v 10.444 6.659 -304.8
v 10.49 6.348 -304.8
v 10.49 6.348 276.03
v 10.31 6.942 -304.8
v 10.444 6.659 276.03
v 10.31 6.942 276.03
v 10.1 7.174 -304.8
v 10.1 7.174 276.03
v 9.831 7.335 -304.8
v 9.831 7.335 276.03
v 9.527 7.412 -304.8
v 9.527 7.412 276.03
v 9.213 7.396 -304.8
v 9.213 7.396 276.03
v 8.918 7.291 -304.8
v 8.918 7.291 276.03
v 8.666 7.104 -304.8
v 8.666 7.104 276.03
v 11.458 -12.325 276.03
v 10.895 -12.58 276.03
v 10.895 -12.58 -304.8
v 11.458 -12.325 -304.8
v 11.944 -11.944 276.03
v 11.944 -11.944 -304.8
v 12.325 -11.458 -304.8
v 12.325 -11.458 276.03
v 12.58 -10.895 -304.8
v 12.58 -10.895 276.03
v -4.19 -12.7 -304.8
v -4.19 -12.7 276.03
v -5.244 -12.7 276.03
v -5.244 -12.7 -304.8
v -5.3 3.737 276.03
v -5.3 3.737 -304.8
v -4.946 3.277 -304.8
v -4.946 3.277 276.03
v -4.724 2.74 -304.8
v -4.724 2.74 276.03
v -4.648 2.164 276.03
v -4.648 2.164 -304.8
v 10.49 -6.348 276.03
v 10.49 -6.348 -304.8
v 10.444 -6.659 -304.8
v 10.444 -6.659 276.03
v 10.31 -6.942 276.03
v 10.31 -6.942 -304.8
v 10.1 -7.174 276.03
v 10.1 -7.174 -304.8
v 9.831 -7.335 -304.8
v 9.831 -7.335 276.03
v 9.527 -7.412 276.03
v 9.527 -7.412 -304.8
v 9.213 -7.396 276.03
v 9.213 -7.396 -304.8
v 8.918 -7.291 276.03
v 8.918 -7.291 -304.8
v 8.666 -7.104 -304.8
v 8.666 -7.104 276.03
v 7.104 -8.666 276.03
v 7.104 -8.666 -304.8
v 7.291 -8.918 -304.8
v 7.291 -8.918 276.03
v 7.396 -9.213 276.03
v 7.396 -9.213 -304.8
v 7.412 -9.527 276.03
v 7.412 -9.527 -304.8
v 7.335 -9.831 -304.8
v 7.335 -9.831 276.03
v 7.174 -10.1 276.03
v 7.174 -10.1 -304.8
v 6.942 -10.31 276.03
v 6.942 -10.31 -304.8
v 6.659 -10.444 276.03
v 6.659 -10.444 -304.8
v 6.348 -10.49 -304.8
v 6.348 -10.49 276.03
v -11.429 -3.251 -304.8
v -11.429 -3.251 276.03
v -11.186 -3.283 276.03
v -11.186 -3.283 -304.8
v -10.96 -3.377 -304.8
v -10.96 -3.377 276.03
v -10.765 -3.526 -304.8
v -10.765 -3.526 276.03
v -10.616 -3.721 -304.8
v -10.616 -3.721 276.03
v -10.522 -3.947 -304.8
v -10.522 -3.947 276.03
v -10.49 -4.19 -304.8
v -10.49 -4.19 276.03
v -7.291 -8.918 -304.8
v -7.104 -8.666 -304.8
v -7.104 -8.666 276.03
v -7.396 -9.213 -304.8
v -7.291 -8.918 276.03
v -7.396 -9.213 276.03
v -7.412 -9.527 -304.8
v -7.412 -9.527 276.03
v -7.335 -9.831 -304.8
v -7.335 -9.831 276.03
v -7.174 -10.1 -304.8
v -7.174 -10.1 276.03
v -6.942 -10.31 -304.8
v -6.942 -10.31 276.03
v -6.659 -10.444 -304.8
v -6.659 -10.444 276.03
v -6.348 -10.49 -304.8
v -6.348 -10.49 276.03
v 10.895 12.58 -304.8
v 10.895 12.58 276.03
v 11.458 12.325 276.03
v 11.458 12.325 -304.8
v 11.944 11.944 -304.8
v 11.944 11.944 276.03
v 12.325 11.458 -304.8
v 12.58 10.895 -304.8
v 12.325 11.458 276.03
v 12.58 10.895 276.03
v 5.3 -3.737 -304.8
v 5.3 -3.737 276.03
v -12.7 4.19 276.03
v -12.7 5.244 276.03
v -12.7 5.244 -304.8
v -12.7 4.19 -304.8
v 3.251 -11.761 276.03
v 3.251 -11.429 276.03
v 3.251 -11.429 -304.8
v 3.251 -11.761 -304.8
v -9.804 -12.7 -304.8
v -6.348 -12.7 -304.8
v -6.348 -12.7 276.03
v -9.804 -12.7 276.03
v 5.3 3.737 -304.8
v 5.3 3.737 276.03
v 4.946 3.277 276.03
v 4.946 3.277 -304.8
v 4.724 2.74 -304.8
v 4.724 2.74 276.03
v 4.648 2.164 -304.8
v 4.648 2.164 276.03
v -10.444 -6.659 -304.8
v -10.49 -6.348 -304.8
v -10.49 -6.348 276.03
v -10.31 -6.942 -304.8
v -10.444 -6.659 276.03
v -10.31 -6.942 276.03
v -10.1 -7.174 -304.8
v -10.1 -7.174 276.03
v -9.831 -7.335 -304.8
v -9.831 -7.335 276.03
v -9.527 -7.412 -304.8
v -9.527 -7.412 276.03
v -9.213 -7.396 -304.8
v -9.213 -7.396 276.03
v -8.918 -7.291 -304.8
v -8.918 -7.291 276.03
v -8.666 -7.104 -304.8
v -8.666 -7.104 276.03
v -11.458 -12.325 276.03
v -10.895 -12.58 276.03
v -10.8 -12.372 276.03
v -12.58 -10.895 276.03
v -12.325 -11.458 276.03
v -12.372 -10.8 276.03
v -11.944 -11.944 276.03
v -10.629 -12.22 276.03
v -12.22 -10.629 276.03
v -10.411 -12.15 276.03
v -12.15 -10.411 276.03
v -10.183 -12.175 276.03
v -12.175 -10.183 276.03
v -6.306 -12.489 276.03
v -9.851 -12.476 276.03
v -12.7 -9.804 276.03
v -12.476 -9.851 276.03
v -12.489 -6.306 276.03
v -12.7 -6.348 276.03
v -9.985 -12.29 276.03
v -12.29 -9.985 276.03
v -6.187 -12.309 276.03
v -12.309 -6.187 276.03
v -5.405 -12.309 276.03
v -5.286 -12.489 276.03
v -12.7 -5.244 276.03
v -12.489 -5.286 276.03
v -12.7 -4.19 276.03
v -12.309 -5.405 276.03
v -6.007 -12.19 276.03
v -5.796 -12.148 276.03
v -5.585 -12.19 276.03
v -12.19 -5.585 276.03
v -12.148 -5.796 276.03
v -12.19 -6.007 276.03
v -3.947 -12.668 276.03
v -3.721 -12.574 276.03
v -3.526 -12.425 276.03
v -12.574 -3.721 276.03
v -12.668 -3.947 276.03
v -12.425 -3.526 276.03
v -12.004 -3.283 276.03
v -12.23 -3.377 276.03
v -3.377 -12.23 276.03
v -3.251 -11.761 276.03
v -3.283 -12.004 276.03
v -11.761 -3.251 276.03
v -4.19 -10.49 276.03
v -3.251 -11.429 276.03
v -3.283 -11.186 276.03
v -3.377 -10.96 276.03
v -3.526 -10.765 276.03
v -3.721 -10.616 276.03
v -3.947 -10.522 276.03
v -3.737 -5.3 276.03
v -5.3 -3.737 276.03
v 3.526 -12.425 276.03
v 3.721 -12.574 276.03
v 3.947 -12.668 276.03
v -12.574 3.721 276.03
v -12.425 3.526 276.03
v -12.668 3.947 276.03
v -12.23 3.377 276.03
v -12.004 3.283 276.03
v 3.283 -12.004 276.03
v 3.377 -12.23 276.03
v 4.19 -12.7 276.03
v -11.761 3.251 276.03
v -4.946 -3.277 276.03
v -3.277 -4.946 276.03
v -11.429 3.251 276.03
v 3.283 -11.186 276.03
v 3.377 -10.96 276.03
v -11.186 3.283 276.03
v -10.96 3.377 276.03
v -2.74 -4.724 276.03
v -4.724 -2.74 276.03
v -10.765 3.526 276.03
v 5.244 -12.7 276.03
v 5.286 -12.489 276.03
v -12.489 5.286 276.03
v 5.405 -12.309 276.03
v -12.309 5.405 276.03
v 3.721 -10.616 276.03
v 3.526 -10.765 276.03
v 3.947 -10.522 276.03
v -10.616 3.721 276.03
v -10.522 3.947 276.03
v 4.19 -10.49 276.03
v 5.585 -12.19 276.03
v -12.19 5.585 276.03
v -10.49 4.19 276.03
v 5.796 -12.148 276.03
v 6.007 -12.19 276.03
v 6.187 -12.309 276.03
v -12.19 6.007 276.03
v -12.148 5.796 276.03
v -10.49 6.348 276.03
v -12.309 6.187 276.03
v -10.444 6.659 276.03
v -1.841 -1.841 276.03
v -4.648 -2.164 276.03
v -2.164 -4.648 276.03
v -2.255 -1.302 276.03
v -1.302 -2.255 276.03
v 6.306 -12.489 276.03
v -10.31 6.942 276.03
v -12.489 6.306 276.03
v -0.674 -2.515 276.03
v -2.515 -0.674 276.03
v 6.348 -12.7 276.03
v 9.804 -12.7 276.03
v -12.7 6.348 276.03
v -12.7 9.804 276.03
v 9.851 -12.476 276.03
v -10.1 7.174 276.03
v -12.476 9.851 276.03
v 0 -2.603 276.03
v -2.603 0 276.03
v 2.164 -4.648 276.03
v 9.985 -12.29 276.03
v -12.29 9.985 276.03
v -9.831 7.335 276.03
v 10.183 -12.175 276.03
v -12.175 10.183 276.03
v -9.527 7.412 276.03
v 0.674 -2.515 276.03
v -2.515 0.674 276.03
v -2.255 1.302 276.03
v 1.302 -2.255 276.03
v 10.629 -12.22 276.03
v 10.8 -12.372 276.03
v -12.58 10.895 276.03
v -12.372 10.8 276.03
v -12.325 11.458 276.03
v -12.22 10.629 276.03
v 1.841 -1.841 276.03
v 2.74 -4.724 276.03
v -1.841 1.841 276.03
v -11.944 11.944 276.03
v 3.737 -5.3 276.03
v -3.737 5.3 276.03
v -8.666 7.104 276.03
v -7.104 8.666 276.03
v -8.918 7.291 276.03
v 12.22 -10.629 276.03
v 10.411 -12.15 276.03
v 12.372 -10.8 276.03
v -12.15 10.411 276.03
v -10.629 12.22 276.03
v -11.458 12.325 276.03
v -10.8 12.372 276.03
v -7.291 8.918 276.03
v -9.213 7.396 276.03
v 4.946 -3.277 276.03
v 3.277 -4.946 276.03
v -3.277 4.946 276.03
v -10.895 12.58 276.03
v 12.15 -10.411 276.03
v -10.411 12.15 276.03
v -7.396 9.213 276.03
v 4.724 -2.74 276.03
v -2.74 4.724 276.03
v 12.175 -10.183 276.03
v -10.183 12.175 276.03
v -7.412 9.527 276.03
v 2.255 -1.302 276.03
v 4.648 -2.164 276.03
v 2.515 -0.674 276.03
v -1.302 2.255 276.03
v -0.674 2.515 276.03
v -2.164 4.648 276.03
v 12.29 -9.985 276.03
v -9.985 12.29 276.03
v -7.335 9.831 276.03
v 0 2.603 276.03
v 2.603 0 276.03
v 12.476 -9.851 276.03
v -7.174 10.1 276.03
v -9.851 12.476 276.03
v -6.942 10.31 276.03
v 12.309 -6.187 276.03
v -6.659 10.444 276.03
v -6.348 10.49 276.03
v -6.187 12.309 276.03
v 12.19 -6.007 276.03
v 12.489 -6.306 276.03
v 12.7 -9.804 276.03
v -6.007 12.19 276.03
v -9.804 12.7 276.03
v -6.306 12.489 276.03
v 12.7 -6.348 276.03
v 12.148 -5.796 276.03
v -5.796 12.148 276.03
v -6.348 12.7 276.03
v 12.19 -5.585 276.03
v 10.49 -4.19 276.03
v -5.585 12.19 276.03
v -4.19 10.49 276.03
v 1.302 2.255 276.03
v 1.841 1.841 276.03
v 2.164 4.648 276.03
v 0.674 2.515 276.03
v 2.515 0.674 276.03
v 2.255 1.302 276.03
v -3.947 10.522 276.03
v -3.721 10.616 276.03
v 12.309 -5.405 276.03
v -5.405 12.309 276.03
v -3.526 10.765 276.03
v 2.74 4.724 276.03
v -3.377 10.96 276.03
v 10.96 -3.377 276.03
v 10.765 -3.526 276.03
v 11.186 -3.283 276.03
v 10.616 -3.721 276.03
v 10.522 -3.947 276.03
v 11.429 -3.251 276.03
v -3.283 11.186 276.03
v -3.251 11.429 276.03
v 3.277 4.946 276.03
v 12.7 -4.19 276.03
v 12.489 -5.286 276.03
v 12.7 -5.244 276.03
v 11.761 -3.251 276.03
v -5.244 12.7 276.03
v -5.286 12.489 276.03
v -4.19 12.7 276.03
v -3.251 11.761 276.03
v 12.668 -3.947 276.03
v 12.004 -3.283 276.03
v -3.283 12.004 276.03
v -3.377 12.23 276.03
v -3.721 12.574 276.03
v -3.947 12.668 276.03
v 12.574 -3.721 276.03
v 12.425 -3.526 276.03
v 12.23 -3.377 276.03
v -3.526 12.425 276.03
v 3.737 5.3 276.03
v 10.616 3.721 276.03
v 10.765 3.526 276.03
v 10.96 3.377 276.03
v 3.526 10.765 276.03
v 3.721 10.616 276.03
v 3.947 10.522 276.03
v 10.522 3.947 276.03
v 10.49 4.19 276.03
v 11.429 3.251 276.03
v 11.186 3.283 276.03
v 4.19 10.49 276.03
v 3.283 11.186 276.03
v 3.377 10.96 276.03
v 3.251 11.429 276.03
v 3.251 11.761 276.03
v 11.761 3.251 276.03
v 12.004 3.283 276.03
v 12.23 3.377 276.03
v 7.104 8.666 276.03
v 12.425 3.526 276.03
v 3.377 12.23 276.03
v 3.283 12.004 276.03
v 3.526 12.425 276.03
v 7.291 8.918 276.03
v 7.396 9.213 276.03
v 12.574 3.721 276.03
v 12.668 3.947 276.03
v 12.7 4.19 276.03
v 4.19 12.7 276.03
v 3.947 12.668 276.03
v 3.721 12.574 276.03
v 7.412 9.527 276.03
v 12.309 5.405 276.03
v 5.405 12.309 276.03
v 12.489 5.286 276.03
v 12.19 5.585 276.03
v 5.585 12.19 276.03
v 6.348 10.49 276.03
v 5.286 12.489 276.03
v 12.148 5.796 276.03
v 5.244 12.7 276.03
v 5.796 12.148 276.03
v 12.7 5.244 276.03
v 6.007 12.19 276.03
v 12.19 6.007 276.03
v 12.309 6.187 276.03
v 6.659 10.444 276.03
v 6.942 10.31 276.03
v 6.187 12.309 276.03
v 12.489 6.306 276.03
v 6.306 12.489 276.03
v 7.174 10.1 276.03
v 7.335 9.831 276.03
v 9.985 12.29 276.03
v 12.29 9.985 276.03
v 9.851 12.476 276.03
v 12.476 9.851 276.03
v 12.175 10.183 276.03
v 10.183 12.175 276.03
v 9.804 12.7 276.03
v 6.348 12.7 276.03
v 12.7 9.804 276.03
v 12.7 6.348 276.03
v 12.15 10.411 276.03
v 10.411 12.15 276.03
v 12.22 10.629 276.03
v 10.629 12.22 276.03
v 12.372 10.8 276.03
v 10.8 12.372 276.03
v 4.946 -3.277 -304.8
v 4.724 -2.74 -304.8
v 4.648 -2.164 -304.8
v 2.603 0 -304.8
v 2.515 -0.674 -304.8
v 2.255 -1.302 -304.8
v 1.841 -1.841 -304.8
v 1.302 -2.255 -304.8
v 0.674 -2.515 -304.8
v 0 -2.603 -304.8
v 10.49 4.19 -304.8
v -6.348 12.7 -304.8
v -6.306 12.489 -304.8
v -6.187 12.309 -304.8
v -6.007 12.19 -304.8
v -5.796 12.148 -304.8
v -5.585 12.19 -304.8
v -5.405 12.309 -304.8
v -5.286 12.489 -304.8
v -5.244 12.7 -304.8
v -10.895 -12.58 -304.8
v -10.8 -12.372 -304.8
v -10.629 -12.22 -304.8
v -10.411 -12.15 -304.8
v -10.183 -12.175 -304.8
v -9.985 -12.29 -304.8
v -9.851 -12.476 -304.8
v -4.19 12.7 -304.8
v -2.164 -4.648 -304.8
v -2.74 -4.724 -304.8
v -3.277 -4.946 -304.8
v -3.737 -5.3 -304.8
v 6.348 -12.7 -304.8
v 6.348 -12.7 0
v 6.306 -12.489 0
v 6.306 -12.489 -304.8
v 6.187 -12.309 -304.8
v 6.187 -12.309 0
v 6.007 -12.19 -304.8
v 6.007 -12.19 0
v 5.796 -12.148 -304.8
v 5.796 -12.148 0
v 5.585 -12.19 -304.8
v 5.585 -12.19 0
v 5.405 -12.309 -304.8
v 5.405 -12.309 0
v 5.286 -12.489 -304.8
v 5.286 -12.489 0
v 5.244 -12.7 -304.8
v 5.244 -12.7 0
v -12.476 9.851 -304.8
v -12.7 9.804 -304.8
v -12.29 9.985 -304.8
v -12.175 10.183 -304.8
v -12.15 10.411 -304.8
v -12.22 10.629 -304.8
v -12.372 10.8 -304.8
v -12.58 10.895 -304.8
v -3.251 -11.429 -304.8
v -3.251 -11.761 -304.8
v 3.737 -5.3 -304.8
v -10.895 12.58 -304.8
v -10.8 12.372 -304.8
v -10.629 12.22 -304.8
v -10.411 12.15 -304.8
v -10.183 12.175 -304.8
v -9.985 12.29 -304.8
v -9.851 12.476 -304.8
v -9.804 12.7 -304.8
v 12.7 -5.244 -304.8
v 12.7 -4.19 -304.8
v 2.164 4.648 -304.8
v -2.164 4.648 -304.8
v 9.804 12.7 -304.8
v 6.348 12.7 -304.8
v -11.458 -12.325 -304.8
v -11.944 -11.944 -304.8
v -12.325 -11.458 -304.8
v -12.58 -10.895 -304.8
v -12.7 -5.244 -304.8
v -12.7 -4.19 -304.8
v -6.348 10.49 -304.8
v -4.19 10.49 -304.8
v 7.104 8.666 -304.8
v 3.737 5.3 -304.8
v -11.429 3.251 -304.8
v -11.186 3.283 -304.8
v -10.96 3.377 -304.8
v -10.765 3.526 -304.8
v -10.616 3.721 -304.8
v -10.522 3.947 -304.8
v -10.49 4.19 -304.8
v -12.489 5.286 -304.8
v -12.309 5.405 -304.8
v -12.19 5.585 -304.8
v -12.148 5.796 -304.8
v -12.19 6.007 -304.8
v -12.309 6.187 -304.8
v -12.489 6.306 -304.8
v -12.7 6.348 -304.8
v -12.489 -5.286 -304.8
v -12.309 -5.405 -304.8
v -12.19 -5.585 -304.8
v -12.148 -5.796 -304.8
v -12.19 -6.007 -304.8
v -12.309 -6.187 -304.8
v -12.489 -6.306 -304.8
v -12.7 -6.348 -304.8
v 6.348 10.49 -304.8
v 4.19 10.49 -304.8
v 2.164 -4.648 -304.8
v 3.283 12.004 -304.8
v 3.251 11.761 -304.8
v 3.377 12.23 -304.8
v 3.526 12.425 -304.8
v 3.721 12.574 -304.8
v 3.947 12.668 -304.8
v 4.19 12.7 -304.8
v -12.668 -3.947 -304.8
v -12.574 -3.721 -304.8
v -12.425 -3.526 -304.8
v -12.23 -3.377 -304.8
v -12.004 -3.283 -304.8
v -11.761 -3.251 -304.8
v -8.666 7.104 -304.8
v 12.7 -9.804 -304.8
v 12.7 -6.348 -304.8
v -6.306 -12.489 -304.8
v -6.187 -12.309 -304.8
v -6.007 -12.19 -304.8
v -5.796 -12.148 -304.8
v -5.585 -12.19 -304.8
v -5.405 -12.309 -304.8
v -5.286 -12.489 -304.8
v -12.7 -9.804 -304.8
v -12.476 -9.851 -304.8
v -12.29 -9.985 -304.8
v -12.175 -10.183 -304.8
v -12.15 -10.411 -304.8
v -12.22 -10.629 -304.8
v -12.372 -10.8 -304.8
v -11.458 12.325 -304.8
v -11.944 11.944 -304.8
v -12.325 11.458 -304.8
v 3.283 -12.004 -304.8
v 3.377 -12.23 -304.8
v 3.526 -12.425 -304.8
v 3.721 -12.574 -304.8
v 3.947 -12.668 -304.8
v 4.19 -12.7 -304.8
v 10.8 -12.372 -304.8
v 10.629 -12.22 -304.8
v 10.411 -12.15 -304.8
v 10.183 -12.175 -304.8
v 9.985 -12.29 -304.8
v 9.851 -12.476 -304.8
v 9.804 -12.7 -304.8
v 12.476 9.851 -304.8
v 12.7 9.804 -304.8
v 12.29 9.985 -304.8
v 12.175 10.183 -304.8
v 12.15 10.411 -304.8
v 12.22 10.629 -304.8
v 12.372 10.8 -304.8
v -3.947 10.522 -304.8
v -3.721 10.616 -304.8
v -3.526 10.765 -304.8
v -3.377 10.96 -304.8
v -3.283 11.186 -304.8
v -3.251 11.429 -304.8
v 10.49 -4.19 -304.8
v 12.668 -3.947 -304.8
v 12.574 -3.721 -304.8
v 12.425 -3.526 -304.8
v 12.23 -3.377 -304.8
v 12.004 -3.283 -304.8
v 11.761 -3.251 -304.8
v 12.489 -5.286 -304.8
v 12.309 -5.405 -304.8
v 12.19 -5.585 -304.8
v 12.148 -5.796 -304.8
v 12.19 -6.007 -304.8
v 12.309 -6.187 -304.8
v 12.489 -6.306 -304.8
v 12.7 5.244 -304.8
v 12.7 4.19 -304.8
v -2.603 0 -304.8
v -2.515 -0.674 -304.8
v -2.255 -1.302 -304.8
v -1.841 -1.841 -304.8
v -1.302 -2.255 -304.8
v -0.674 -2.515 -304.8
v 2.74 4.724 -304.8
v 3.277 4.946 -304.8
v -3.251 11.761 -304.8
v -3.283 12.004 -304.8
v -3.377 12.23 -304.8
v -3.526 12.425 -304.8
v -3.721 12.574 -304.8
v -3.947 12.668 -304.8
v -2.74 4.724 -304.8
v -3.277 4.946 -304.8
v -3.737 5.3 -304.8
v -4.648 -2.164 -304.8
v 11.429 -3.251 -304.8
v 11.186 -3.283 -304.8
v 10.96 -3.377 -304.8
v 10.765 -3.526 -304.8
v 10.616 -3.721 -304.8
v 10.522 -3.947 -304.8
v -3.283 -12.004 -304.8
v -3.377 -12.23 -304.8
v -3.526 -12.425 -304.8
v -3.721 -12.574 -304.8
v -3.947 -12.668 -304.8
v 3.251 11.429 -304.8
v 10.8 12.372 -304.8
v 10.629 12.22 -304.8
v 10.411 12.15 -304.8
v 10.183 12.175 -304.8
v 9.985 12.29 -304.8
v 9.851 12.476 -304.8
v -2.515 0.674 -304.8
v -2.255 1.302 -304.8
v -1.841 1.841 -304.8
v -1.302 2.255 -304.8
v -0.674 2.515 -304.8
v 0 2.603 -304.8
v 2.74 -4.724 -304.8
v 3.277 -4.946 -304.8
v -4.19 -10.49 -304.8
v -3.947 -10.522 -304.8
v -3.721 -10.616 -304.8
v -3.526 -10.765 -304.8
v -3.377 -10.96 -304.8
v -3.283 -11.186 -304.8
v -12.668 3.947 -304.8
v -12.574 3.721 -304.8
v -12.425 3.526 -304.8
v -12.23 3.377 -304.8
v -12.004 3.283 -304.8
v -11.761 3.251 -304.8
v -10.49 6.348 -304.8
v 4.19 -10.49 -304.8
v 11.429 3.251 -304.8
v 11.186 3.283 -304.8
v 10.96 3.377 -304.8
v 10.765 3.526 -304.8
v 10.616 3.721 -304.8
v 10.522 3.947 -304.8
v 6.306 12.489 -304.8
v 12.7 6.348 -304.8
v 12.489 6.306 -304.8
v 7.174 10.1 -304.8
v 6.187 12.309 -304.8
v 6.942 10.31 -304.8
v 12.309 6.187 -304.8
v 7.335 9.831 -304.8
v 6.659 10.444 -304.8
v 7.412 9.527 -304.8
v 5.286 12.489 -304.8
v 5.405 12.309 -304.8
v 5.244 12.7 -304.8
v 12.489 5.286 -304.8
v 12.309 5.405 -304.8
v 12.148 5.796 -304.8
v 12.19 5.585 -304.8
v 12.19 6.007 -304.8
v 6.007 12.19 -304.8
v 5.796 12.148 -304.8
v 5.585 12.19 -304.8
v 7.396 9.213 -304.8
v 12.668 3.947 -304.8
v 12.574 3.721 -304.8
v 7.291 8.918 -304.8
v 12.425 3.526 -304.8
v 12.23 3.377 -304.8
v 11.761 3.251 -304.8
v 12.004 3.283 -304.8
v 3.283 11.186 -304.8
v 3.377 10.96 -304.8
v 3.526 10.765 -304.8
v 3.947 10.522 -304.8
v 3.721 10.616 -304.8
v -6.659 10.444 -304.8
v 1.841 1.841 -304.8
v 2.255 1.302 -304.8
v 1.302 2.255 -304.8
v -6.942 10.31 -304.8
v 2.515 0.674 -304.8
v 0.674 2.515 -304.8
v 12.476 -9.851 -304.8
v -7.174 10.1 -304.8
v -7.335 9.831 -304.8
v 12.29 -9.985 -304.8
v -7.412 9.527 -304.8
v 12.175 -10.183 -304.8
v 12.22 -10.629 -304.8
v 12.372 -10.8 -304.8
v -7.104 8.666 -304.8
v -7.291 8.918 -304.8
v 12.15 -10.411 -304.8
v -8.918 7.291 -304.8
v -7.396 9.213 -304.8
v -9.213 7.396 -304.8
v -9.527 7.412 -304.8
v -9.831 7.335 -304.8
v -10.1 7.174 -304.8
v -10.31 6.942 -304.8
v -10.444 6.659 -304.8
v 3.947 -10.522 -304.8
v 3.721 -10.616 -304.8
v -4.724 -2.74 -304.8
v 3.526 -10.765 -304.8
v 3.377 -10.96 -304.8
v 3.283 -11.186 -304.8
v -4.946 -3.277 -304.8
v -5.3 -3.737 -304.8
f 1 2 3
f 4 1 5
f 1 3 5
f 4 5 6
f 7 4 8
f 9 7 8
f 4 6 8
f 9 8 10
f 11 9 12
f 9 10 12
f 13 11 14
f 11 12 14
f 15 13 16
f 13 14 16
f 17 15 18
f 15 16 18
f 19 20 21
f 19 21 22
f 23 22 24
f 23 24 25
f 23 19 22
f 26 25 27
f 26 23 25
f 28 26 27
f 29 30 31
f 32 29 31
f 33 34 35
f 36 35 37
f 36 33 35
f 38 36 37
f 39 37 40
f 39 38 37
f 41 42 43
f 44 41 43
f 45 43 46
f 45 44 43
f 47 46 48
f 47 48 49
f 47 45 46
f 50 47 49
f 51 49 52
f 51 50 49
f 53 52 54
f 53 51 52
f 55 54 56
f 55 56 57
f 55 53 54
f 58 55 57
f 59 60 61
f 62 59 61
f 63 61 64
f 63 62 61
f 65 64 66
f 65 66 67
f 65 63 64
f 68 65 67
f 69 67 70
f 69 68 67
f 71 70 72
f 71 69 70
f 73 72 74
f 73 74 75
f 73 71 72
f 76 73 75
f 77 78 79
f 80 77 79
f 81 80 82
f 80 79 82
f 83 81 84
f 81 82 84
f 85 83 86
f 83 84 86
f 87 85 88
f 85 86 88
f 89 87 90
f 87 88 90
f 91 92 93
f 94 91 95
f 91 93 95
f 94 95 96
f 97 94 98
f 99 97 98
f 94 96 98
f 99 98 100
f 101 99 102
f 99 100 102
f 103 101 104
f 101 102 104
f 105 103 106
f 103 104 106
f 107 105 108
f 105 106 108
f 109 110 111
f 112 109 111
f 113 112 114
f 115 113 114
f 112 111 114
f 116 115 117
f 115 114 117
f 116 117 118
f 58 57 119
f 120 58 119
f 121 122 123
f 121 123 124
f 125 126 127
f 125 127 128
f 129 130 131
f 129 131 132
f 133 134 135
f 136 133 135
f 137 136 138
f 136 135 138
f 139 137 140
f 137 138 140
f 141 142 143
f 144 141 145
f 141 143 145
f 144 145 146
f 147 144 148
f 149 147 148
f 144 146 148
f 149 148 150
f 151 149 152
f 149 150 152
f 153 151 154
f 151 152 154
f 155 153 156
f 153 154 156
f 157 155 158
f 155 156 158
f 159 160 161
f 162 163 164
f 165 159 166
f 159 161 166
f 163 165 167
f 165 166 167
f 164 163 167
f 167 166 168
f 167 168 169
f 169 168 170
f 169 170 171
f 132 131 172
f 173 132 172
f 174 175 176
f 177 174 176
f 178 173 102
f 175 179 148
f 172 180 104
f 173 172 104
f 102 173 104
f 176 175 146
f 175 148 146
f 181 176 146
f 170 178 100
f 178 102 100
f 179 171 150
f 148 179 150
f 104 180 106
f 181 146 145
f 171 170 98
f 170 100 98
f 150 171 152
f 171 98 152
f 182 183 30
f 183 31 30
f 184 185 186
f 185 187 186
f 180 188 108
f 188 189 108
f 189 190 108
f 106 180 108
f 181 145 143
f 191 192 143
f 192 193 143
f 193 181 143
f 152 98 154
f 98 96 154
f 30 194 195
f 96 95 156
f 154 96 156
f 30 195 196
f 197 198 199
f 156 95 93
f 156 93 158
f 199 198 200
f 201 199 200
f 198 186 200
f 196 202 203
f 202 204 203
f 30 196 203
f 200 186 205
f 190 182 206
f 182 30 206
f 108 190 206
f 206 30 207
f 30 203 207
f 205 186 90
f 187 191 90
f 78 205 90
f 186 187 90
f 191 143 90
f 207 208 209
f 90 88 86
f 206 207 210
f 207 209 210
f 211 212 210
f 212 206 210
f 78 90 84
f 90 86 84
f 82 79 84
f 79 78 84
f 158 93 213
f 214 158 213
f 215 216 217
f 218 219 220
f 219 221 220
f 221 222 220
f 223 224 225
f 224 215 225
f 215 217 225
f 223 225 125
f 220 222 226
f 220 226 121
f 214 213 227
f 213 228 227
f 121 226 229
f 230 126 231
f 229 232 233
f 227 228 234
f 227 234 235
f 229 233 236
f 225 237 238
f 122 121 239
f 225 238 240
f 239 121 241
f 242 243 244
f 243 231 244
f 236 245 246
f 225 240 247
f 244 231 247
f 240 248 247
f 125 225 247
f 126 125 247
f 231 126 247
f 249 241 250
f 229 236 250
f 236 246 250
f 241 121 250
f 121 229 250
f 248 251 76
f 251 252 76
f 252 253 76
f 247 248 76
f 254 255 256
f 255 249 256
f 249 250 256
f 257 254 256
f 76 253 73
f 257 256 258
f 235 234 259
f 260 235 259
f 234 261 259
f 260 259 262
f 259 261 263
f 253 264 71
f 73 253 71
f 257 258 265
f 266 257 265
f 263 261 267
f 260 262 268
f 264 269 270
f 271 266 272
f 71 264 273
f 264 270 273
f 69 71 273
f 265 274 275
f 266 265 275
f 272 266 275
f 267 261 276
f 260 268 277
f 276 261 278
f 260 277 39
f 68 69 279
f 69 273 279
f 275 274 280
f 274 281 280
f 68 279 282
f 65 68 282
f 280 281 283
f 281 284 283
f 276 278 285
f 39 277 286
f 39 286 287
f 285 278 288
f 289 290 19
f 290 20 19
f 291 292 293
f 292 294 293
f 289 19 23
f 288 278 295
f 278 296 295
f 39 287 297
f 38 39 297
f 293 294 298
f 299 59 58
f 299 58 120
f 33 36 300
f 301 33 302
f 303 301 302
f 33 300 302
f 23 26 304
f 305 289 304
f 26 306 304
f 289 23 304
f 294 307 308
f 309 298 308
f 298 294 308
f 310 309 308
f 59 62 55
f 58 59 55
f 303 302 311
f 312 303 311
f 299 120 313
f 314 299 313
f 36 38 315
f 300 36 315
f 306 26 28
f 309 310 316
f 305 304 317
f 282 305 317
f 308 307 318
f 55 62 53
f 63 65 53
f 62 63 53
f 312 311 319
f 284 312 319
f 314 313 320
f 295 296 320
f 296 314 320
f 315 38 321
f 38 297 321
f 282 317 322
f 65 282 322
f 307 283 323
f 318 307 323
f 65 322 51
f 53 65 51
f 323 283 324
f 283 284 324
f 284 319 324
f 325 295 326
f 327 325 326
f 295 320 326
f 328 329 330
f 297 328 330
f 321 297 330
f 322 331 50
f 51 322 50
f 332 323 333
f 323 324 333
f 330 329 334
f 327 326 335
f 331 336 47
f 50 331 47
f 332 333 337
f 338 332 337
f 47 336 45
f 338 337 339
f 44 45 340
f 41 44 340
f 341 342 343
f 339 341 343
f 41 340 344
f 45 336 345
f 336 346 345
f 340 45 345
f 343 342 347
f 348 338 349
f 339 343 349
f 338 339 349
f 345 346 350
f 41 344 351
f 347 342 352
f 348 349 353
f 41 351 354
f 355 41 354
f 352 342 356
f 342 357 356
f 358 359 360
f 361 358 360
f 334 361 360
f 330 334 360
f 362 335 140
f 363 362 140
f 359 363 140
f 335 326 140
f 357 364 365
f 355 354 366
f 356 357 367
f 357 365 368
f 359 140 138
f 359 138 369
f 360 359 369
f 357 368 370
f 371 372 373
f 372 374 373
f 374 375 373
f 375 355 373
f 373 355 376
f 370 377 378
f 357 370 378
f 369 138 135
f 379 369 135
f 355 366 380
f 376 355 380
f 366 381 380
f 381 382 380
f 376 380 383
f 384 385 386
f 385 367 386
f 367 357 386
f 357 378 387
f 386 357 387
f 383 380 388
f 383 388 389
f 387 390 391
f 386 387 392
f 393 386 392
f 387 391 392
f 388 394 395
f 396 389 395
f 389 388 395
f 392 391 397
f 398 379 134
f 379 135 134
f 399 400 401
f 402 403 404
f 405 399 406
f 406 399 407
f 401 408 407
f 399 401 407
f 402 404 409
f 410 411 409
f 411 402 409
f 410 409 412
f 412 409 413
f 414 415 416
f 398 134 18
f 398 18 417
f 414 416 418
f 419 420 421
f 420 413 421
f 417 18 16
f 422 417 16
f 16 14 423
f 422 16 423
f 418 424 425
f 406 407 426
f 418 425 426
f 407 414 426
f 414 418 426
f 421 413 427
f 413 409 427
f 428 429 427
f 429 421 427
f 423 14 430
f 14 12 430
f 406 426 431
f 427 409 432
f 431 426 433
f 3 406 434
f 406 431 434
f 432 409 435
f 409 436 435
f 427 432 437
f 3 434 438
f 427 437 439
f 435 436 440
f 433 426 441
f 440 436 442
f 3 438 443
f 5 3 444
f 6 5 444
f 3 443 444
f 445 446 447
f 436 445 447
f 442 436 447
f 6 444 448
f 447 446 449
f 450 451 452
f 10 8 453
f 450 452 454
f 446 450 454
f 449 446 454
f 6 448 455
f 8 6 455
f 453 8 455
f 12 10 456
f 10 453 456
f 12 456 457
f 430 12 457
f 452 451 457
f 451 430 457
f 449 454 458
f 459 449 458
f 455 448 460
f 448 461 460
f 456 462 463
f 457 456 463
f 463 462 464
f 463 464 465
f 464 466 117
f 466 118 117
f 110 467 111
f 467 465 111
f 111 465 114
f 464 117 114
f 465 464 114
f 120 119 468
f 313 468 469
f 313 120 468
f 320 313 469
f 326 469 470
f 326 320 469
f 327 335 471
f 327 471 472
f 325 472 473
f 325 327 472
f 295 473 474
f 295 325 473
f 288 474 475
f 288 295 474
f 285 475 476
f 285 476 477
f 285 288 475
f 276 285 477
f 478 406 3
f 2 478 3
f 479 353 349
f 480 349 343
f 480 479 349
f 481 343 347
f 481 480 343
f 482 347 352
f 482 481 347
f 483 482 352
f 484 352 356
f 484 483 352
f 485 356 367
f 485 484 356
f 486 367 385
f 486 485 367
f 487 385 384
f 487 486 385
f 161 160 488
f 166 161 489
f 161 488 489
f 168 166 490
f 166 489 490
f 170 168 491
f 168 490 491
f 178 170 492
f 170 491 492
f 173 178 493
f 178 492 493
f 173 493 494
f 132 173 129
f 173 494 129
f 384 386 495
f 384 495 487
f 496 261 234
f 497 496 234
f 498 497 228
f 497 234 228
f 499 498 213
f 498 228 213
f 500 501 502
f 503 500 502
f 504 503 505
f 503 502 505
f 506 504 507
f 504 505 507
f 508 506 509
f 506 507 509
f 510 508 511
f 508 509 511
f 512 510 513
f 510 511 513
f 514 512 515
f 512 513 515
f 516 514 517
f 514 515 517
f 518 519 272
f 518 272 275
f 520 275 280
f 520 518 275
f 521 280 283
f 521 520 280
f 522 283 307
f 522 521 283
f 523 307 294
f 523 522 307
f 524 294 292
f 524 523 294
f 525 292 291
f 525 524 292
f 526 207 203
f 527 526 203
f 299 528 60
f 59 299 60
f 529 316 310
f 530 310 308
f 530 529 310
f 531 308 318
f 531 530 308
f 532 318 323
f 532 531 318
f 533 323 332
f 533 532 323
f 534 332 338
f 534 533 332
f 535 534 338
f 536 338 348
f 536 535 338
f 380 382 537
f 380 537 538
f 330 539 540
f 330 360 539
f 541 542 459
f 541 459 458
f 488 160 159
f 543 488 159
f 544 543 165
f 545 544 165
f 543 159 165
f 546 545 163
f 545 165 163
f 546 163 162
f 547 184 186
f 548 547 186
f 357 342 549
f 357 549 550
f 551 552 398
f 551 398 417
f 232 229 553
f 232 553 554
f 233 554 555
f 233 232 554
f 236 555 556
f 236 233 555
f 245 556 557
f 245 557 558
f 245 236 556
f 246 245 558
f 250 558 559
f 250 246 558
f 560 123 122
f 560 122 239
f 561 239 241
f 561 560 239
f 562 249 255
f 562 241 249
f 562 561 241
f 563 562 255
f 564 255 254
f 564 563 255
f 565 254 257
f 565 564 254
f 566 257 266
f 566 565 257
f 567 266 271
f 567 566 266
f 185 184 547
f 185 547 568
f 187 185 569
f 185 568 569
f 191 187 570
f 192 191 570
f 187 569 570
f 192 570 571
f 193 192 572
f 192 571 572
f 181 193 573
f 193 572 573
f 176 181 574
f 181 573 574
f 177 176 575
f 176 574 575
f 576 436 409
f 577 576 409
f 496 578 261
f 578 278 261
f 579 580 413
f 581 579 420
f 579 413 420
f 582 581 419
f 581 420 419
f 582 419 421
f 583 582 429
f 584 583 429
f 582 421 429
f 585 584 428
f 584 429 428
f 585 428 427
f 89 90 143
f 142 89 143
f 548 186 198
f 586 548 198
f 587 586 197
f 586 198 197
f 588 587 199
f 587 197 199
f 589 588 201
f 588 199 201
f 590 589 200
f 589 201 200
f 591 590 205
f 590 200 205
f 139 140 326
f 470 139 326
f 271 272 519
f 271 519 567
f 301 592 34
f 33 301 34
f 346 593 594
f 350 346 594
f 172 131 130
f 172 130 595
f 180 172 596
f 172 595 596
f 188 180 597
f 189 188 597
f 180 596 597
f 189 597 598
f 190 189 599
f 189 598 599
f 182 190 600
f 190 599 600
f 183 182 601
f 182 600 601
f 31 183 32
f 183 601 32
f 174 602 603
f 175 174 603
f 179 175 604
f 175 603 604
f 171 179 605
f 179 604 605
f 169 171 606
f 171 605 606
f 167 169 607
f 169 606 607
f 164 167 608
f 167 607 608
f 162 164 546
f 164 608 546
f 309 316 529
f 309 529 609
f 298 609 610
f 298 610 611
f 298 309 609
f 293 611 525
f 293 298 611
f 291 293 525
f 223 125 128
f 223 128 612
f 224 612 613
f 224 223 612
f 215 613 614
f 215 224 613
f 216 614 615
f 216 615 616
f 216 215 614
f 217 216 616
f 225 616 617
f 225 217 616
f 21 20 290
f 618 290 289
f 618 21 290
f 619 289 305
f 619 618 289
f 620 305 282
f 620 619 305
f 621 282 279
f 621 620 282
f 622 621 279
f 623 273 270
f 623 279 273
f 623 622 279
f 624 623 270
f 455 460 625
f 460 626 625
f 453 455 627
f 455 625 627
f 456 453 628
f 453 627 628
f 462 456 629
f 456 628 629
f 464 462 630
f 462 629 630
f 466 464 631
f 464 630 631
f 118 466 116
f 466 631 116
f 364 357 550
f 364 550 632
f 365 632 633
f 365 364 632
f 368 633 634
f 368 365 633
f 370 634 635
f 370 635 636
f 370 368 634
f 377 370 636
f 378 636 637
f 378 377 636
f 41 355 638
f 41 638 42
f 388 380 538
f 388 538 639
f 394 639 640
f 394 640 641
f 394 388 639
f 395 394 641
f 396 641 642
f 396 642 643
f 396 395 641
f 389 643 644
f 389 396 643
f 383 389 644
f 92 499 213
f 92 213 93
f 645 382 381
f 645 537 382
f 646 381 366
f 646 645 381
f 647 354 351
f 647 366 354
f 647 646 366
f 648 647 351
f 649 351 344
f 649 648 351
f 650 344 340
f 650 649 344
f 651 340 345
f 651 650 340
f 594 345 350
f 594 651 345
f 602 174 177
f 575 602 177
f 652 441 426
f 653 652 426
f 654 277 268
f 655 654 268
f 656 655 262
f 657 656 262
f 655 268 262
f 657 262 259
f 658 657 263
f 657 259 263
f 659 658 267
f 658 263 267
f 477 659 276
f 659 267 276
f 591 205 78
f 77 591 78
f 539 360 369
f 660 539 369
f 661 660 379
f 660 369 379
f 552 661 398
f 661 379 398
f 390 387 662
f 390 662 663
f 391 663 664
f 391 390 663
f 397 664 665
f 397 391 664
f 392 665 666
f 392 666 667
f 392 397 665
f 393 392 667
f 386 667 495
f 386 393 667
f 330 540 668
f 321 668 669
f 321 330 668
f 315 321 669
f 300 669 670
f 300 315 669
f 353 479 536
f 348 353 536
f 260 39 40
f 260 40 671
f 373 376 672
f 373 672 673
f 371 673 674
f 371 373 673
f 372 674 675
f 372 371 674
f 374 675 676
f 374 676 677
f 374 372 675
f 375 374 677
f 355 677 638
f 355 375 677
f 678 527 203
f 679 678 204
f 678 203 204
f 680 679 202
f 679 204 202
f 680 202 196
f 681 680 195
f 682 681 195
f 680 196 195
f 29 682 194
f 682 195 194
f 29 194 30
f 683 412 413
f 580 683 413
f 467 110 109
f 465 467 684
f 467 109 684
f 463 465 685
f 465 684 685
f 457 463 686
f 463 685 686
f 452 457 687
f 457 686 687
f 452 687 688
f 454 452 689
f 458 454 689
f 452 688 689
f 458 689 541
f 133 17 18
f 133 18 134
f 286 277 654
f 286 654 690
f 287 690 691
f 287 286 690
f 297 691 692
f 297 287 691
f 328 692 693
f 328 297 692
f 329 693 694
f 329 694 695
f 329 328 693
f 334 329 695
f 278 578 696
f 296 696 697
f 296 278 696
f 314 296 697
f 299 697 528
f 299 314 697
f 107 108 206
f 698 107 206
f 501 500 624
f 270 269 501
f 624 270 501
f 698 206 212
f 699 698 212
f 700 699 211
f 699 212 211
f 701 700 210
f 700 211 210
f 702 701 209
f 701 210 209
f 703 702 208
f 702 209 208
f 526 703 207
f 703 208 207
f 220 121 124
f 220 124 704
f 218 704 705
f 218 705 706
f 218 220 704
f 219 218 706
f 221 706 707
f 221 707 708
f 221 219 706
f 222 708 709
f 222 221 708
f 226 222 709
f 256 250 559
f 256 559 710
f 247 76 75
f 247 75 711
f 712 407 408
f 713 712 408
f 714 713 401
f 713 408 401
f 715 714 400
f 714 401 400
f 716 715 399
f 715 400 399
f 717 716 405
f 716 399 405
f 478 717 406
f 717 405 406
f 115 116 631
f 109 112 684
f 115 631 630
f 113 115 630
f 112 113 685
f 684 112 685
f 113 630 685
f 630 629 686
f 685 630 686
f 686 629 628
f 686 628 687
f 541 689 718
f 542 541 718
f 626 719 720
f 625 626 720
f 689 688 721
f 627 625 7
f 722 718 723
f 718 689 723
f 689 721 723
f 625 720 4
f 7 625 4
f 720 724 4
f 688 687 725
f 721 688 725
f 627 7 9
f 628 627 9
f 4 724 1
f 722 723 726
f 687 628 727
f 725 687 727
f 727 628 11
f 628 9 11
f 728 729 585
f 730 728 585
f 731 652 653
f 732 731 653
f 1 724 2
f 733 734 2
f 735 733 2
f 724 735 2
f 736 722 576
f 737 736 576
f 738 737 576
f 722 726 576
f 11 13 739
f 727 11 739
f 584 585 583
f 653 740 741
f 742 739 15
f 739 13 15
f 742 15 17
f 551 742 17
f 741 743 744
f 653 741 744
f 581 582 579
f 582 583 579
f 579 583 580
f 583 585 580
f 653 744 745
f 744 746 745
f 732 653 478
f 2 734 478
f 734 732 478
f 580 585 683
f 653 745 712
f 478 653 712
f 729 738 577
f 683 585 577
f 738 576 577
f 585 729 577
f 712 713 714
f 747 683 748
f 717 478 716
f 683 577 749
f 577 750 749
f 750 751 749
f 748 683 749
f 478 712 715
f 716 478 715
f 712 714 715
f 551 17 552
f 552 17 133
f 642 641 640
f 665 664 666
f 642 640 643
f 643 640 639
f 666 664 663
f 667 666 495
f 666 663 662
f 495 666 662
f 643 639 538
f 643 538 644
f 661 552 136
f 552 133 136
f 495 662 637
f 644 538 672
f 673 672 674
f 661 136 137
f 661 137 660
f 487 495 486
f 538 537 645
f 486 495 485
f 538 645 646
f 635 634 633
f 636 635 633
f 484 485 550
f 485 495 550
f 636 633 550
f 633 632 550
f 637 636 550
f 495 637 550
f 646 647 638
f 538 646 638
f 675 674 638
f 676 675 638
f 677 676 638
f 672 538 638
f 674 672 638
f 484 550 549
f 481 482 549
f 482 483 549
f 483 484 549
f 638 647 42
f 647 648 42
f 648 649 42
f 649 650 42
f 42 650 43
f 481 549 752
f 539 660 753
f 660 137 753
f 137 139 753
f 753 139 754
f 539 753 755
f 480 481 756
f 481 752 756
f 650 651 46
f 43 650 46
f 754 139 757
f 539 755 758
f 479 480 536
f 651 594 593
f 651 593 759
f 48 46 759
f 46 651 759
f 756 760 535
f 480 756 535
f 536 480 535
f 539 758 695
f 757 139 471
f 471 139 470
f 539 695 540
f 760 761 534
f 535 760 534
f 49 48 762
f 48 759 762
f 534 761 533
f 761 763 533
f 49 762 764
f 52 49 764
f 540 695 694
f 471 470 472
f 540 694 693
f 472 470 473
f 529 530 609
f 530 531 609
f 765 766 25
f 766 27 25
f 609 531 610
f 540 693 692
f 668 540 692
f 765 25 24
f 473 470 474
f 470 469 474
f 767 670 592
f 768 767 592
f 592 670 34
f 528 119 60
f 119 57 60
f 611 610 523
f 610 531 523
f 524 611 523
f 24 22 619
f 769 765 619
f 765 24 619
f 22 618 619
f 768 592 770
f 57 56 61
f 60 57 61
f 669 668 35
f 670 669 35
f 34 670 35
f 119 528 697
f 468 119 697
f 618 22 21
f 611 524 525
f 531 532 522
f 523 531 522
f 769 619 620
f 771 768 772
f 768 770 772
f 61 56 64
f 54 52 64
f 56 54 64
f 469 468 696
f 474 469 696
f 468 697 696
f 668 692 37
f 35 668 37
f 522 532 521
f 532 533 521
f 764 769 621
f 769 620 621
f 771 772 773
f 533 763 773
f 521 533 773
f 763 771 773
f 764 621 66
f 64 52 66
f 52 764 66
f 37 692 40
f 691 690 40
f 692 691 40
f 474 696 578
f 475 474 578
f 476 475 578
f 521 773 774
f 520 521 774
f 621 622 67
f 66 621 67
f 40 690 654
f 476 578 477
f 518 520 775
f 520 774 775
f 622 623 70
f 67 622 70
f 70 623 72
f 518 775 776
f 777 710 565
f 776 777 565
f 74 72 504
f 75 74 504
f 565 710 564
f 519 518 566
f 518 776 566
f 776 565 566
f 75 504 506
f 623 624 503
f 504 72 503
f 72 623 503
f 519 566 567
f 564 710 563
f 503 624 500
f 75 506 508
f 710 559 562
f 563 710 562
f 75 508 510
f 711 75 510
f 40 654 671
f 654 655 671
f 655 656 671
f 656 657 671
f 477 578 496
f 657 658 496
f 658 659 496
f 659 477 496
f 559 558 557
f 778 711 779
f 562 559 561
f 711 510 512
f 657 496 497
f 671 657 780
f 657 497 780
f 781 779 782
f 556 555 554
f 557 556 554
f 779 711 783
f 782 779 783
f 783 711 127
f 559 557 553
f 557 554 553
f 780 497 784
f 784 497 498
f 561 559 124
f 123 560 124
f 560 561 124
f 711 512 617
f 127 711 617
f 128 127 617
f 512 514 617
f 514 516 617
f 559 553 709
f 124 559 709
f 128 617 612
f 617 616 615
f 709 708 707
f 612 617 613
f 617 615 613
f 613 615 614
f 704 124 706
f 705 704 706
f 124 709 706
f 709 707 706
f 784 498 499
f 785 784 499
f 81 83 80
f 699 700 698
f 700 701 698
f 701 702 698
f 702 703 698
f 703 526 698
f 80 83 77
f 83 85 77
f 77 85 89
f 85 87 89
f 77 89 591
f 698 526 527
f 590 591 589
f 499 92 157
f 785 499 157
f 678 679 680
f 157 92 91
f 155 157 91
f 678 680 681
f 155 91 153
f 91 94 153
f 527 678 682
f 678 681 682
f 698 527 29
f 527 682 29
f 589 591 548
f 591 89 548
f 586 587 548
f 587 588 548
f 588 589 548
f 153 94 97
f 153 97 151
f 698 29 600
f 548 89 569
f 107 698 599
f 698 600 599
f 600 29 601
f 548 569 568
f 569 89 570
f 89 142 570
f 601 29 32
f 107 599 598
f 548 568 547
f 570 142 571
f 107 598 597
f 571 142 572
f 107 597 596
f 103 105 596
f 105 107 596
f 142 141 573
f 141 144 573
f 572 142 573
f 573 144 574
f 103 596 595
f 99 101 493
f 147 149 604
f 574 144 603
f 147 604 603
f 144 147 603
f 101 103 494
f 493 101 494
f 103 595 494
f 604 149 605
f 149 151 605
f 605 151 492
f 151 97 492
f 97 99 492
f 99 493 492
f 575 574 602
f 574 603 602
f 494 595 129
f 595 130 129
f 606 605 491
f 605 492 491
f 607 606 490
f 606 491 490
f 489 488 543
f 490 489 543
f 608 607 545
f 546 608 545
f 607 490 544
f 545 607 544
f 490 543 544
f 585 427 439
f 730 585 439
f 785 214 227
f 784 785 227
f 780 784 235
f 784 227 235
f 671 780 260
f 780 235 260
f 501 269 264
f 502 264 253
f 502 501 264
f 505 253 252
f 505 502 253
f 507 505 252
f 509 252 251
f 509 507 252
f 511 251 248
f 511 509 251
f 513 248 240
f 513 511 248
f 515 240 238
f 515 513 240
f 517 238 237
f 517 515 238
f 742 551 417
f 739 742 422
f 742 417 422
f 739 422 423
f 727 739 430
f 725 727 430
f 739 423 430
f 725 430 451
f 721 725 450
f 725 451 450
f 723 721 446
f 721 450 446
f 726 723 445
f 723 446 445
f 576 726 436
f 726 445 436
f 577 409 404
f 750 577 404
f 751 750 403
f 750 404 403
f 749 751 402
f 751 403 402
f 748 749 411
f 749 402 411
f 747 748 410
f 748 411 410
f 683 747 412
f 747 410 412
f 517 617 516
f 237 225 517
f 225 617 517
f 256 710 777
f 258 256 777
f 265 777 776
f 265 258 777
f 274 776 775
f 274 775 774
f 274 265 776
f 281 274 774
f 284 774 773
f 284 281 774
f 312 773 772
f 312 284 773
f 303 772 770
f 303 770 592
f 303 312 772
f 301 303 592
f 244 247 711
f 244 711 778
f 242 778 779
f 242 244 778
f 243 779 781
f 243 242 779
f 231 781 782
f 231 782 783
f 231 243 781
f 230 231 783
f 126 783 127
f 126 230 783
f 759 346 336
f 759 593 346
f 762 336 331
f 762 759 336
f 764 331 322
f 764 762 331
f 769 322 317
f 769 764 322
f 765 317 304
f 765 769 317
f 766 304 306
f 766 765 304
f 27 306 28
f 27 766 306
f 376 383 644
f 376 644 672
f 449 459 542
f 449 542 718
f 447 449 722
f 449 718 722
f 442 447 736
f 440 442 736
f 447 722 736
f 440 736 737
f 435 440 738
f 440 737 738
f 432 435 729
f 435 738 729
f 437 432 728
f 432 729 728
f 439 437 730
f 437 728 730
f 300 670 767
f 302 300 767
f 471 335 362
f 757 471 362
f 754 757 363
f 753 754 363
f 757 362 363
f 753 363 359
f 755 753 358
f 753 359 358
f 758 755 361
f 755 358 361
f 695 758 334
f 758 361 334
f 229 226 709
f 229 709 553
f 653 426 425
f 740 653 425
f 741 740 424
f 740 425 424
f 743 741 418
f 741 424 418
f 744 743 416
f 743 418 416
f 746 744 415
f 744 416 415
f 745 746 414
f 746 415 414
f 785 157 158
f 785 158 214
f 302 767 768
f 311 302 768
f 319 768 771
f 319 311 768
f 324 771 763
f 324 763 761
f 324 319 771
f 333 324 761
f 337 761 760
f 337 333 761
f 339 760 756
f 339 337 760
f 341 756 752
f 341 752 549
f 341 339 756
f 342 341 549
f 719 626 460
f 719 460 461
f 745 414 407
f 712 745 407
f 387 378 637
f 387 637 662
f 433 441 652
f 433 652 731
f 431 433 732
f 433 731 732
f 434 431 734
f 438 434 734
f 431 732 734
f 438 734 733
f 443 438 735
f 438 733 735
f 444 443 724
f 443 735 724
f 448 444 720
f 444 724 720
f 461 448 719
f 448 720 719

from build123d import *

# Parameters (mm, degrees)
BOSS_EXTRUDE1_DEPTH     = 304.8
SKETCH5_R               = 0.55245
CUT_EXTRUDE1_DEPTH      = 305.8
CUT_EXTRUDE1_DEPTH_BACK = 305.8
SKETCH6_W               = 28.77
SKETCH6_H               = 75.458782243
CUT_EXTRUDE2_DEPTH      = 60


with BuildPart() as part:
    # Sketch4 → Boss-Extrude1 (new body, symmetric)
    with BuildSketch(Plane.XY):
        with BuildLine():
            Line((4.190365, -12.7), (10.11729625, -12.7))
            ThreePointArc((10.11729625, -12.7), (11.943543585, -11.943543585), (12.7, -10.11729625))
            Line((12.7, -10.11729625), (12.7, -4.190365))
            ThreePointArc((12.7, -4.190365), (12.42492494, -3.52627506), (11.760835, -3.2512))
            Line((11.760835, -3.2512), (11.429365, -3.2512))
            ThreePointArc((11.429365, -3.2512), (10.76527506, -3.52627506), (10.4902, -4.190365))
            Line((10.4902, -4.190365), (10.4902, -6.348478019))
            ThreePointArc((10.4902, -6.348478019), (9.830707141, -7.335478831), (8.666460301, -7.103895736))
            Line((8.666460301, -7.103895736), (5.299899128, -3.737334563))
            ThreePointArc((5.299899128, -3.737334563), (4.817571085, -3.015479634), (4.6482, -2.16399369))
            Line((4.6482, -2.16399369), (4.6482, 0))
            Line((4.6482, 0), (2.6035, 0))
            ThreePointArc((2.6035, 0), (1.840952505, -1.840952505), (0, -2.6035))
            Line((0, -2.6035), (0, -4.6482))
            Line((0, -4.6482), (2.16399369, -4.6482))
            ThreePointArc((2.16399369, -4.6482), (3.015479634, -4.817571085), (3.737334563, -5.299899128))
            Line((3.737334563, -5.299899128), (7.103895736, -8.666460301))
            ThreePointArc((7.103895736, -8.666460301), (7.335478831, -9.830707141), (6.348478019, -10.4902))
            Line((6.348478019, -10.4902), (4.190365, -10.4902))
            ThreePointArc((4.190365, -10.4902), (3.52627506, -10.76527506), (3.2512, -11.429365))
            Line((3.2512, -11.429365), (3.2512, -11.760835))
            ThreePointArc((3.2512, -11.760835), (3.52627506, -12.42492494), (4.190365, -12.7))
        make_face()
    extrude(amount=BOSS_EXTRUDE1_DEPTH, both=True)

    # Sketch5 → Cut-Extrude1 (cut, two sides)
    with BuildSketch(Plane.XY) as cut_extrude1_sk:
        with Locations((10.356153152, -12.7)):
            Circle(SKETCH5_R)
        with Locations((5.796028019, -12.7)):
            Circle(SKETCH5_R)
        with Locations((12.7, -10.356153152)):
            Circle(SKETCH5_R)
        with Locations((12.7, -5.796028019)):
            Circle(SKETCH5_R)
    extrude(amount=CUT_EXTRUDE1_DEPTH, mode=Mode.SUBTRACT)
    extrude(cut_extrude1_sk.sketch, amount=-CUT_EXTRUDE1_DEPTH_BACK, mode=Mode.SUBTRACT)

    # Mirror1: part across plane


with BuildPart() as part_1:
    add(part.part)
    add(part.part.mirror(Plane(origin=(0, 0, 0), x_dir=(0, 0, 1), z_dir=(1, 0, 0))))

    # Mirror2: part across plane


with BuildPart() as part_2:
    add(part_1.part)
    add(part_1.part.mirror(Plane.ZX))

    # Sketch6 → Cut-Extrude2 (cut)
    with BuildSketch(Plane(origin=(12.7, 0, 0), x_dir=(0, 0, -1), z_dir=(1, 0, 0))):
        with Locations((-290.415, -8.479048352)):
            Rectangle(SKETCH6_W, SKETCH6_H)
    extrude(amount=-CUT_EXTRUDE2_DEPTH, mode=Mode.SUBTRACT)


solid = part_2.part
